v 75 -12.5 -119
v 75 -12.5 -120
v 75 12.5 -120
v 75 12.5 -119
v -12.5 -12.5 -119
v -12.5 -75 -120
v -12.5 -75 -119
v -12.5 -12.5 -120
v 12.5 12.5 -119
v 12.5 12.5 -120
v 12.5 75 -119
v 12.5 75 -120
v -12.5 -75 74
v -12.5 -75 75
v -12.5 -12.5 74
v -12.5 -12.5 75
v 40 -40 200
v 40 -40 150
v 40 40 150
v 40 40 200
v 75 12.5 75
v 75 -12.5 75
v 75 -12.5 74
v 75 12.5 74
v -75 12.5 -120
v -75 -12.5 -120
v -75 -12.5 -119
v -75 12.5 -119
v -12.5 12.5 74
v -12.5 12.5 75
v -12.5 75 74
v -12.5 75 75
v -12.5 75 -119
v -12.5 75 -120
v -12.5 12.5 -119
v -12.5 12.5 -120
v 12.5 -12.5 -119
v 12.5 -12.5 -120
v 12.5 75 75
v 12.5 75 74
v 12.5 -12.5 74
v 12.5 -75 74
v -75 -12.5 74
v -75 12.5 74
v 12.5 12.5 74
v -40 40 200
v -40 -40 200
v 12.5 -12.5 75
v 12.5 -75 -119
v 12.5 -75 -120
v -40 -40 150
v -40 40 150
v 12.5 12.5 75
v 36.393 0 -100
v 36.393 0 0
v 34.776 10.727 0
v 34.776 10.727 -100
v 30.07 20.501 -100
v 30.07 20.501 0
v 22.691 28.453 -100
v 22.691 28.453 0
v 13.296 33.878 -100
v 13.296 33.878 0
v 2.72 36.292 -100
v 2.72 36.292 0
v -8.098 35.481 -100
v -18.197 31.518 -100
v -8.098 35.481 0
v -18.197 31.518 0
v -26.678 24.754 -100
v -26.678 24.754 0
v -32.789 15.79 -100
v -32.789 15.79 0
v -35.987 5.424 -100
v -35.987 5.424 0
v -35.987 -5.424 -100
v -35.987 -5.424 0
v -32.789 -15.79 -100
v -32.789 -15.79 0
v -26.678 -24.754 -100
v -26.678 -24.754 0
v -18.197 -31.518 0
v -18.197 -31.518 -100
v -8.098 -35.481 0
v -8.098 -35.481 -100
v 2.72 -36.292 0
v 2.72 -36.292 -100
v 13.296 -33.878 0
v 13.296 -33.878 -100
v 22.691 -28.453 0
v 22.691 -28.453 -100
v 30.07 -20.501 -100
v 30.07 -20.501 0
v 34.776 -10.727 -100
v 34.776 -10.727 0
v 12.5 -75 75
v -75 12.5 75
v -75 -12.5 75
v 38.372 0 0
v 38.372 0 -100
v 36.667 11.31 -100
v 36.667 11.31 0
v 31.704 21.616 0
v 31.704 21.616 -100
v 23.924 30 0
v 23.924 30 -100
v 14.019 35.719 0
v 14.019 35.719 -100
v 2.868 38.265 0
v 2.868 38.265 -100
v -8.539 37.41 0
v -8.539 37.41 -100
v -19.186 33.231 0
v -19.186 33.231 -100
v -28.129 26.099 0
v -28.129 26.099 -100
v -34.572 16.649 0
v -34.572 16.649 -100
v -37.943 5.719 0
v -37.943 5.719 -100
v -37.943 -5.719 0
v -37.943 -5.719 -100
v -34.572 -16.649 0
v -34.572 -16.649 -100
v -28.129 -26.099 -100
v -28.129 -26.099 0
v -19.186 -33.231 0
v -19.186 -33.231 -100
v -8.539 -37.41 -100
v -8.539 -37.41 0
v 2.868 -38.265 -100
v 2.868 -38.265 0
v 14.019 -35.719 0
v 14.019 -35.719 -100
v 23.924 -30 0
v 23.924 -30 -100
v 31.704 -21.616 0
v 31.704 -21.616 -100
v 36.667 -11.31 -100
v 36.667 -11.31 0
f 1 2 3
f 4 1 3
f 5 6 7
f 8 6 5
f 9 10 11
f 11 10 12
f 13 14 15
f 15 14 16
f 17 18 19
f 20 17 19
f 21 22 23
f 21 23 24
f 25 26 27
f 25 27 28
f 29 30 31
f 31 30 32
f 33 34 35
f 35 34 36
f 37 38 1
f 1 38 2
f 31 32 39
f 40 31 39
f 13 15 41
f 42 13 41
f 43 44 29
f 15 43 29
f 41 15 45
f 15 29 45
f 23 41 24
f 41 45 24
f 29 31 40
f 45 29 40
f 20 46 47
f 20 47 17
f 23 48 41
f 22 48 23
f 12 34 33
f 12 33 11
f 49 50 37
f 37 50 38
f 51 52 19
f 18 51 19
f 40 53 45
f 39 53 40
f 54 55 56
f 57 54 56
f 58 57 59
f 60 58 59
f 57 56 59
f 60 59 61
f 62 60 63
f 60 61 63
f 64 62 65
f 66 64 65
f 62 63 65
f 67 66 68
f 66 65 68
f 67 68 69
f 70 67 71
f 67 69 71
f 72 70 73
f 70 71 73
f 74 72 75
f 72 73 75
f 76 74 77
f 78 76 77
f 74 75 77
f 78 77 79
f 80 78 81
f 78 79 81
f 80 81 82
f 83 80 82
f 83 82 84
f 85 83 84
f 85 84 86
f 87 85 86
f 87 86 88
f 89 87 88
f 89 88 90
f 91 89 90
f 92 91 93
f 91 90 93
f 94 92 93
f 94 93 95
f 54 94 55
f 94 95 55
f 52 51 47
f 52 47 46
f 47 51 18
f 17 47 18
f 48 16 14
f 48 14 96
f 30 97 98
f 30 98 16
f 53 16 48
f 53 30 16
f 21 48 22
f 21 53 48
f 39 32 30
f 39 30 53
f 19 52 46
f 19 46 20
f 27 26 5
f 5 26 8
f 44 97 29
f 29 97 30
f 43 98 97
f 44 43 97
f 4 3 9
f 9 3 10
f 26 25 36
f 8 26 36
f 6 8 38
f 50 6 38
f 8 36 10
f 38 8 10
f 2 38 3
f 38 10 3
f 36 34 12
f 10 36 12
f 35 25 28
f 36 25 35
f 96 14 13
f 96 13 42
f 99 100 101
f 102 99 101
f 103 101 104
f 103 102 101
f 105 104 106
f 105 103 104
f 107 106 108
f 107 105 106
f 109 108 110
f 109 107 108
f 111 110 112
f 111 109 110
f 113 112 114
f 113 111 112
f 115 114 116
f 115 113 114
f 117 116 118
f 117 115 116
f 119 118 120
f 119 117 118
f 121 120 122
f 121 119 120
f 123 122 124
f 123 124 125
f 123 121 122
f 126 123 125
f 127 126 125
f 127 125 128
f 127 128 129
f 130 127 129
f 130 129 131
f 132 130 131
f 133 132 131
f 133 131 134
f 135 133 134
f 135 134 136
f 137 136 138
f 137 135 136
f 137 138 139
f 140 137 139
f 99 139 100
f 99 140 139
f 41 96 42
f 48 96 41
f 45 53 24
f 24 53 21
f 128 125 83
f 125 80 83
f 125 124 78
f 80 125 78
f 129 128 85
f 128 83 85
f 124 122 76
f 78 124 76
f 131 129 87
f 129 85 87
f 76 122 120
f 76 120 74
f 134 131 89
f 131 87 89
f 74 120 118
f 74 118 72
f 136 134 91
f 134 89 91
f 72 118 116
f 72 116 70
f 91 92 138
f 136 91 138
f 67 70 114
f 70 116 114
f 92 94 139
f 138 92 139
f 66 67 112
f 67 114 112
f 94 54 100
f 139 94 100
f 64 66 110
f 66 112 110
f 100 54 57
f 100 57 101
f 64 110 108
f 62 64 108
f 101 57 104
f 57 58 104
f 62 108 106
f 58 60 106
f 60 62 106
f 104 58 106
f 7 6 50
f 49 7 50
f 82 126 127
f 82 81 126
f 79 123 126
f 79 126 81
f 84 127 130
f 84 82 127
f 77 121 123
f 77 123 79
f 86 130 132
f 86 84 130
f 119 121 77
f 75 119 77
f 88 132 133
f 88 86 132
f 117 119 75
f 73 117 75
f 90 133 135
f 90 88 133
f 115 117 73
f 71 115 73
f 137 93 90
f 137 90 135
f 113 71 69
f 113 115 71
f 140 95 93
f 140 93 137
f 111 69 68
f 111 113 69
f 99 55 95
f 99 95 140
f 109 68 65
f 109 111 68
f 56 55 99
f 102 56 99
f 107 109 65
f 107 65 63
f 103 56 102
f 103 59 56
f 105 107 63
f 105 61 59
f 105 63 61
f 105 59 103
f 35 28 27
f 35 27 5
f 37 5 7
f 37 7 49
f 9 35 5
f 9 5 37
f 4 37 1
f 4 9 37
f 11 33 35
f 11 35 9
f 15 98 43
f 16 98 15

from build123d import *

# Parameters (mm, degrees)
F0_R      = 38.3718169686
F1_DEPTH  = 100
F2_R      = 36.3933090035
F3_DEPTH  = 100
F5_W      = 80
F5_H      = 80
F6_DEPTH  = 50
F11_W     = 62.5
F11_H     = 25
F11_W_2   = 25
F11_H_2   = 62.5
F12_DEPTH = 1
F14_W     = 62.5
F14_H     = 25
F14_W_2   = 25
F14_H_2   = 62.5
F15_DEPTH = 1


# Not quite as in the source:
# - the program builds the solid bodies; features that only make, move or delete a surface that nothing else refers to are left out


with BuildPart() as f1:
    # F0 (on Top) → F1 (new body)
    with BuildSketch(Plane.XY):
        Circle(F0_R)
    extrude(amount=-F1_DEPTH)

    # F2 (on face) → F3 (cut)
    with BuildSketch(Plane.XY):
        Circle(F2_R)
    extrude(amount=-F3_DEPTH, mode=Mode.SUBTRACT)


with BuildPart() as f6:
    # F5 (on offset) → F6 (new body)
    with BuildSketch(Plane.XY.offset(150)):
        Rectangle(F5_W, F5_H)
    extrude(amount=F6_DEPTH)


with BuildPart() as f12:
    # F11 (on offset) → F12 (new body)
    with BuildSketch(Plane.XY.offset(75)):
        with Locations((-43.75, 0)):
            Rectangle(F11_W, F11_H)
        with Locations((0, 43.75)):
            Rectangle(F11_W_2, F11_H_2)
        Rectangle(F11_W_2, F11_H)
        with Locations((43.75, 0)):
            Rectangle(F11_W, F11_H)
        with Locations((0, -43.75)):
            Rectangle(F11_W_2, F11_H_2)
    extrude(amount=-F12_DEPTH)


with BuildPart() as f15:
    # F14 (on offset) → F15 (new body)
    with BuildSketch(Plane.XY.offset(-120)):
        with Locations((43.75, 0)):
            Rectangle(F14_W, F14_H)
        Rectangle(F14_W_2, F14_H)
        with Locations((0, 43.75)):
            Rectangle(F14_W_2, F14_H_2)
        with Locations((-43.75, 0)):
            Rectangle(F14_W, F14_H)
        with Locations((0, -43.75)):
            Rectangle(F14_W_2, F14_H_2)
    extrude(amount=F15_DEPTH)


solid = Compound([f1.part, f6.part, f12.part, f15.part])
